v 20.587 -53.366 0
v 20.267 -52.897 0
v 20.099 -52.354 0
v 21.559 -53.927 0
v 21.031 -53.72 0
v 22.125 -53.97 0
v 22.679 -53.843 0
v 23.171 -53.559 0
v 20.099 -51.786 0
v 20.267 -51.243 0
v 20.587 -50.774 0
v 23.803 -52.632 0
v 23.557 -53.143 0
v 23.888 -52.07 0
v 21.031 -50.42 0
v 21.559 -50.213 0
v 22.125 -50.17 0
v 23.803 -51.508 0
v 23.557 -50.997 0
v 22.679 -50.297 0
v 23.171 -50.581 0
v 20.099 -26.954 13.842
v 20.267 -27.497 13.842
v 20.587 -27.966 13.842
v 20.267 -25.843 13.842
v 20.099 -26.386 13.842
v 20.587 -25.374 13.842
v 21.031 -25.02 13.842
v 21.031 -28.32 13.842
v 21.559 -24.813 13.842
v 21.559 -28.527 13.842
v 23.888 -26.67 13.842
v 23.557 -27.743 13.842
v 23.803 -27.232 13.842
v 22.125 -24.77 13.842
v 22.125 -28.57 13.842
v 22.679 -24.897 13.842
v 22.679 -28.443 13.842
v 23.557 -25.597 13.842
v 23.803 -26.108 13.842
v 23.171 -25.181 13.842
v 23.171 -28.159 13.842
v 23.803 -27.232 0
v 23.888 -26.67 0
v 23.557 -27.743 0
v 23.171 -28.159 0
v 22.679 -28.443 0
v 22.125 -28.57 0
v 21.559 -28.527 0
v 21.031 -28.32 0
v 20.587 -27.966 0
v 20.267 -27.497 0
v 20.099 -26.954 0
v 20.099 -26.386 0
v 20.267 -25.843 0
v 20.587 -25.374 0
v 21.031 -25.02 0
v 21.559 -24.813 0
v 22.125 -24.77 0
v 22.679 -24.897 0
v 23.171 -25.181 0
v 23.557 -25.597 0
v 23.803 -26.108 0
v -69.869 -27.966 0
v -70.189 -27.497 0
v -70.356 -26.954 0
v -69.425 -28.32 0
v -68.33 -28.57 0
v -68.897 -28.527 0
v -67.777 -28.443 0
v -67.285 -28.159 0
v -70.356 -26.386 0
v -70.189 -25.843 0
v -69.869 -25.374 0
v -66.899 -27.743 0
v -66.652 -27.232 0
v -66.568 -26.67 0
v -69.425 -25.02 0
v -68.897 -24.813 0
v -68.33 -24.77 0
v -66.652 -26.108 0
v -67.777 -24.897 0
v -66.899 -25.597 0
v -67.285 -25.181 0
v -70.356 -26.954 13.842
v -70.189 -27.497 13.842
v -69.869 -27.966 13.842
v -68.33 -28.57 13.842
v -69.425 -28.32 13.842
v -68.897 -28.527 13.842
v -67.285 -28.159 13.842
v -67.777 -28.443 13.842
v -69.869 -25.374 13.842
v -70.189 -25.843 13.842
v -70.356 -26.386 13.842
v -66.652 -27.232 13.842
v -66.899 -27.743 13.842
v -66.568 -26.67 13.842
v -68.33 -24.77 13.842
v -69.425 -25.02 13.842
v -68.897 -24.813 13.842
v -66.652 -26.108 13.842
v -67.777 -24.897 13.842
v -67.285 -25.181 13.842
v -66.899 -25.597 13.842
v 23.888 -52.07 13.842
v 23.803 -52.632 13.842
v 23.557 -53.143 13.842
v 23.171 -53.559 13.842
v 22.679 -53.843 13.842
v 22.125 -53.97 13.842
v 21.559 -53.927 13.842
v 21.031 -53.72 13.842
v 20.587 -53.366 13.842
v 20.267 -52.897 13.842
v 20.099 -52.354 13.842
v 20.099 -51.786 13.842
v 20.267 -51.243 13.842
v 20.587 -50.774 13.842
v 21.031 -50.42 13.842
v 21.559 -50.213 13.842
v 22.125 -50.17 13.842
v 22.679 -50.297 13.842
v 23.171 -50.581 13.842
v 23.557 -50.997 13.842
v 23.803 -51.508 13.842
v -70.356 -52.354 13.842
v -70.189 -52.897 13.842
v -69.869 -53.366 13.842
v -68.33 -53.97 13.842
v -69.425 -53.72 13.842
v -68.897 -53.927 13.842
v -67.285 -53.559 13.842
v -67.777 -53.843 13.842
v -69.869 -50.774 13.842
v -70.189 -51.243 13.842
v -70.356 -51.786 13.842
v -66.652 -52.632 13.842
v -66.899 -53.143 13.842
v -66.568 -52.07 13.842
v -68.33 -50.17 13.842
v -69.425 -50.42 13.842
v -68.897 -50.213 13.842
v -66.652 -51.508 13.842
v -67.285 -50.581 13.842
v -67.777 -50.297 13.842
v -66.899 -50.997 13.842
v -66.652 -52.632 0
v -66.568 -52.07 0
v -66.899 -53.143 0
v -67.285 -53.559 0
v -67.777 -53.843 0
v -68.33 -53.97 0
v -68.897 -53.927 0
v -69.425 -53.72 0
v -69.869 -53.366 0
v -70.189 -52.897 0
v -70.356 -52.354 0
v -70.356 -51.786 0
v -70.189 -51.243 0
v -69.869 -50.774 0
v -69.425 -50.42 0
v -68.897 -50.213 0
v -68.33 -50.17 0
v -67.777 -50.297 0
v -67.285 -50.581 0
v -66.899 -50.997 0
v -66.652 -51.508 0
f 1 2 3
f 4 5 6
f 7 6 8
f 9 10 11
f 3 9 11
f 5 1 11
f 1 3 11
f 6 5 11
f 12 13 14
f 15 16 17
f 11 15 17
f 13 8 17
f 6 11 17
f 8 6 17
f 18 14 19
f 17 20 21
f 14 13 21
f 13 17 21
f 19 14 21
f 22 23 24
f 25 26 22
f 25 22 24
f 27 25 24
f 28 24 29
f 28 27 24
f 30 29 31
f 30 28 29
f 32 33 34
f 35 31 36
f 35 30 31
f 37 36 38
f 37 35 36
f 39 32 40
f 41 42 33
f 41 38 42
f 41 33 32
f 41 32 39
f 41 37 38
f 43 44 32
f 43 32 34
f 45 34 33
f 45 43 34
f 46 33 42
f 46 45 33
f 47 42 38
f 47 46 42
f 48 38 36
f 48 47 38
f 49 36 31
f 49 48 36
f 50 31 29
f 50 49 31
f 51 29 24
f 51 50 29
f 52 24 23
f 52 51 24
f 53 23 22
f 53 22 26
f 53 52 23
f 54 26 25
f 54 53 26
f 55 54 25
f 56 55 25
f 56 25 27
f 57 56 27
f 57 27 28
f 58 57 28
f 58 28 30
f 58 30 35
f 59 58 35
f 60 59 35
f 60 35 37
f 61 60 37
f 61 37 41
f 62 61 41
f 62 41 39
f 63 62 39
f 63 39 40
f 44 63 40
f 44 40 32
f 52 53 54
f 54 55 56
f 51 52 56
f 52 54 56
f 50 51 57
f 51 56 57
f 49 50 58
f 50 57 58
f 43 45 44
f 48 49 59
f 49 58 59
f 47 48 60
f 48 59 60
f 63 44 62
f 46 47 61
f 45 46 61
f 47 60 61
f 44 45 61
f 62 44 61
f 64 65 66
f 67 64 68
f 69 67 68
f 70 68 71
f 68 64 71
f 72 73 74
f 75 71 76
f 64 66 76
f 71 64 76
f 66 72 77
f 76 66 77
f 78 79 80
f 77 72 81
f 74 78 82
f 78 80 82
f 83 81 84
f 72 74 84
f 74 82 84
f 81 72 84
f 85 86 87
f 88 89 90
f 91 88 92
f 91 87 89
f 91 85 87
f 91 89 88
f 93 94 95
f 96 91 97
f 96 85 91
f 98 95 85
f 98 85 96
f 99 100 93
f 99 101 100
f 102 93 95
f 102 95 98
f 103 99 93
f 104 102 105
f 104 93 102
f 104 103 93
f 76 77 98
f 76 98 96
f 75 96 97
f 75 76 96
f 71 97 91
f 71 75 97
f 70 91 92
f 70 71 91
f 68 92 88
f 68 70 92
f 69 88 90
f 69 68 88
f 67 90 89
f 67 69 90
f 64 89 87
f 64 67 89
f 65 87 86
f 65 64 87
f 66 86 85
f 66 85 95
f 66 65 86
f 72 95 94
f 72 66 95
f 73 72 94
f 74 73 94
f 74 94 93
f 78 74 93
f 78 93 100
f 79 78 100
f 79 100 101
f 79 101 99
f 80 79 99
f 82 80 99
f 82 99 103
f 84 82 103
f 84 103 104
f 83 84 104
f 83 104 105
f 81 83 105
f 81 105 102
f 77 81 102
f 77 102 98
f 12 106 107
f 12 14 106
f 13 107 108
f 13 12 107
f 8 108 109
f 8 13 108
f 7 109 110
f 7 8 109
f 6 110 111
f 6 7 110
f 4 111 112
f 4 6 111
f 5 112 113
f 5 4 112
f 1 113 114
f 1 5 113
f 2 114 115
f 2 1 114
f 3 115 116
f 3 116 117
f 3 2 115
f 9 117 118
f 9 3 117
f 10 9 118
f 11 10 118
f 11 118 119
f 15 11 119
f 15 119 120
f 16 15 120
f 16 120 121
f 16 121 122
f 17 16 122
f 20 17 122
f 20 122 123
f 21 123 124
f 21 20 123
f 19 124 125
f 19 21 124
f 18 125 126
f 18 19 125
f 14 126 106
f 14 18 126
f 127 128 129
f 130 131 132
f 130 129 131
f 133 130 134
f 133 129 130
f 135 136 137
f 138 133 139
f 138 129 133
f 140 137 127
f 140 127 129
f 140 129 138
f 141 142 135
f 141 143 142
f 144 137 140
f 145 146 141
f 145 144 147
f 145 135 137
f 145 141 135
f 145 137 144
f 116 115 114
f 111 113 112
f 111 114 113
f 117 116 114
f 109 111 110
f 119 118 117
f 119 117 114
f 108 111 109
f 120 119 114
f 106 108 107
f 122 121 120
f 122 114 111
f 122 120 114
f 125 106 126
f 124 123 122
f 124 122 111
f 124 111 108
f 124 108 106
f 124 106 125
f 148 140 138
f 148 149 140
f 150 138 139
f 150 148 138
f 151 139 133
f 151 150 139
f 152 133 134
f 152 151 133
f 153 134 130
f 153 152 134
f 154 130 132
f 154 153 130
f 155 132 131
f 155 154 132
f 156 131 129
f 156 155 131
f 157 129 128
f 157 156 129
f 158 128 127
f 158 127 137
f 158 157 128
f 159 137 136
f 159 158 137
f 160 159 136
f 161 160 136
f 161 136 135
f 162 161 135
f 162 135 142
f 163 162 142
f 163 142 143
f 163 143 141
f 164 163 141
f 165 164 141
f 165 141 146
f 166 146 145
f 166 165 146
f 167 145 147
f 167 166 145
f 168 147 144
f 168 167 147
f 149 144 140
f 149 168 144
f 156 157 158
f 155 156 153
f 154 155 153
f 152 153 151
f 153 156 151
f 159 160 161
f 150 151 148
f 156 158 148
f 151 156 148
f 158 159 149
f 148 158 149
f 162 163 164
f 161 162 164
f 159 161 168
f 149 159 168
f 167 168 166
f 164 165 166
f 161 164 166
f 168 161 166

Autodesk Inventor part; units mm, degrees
ref_plane "YZ Plane" through (0, 0, 0) normal (1, 0, 0) x (0, 1, 0)
ref_plane "XZ Plane" through (0, 0, 0) normal (0, 1, 0) x (-1, 0, 0)
sketch "Sketch2" plane through (0, 0, 0) normal (0, 0, 1) x (1, 0, 0)
  arc A0 (-66.5677, -26.035) -> (-67.8377, -24.765) centre (-67.8377, -26.035) ccw projected
  line L0 (-66.5677, -26.035) -> (-66.5677, -27.305) projected
  arc A1 (-67.8377, -28.575) -> (-66.5677, -27.305) centre (-67.8377, -27.305) ccw projected
  arc A2 (-66.5677, -51.435) -> (-67.8377, -50.165) centre (-67.8377, -51.435) ccw projected
  line L1 (-66.5677, -51.435) -> (-66.5677, -52.705) projected
  arc A3 (-67.8377, -53.975) -> (-66.5677, -52.705) centre (-67.8377, -52.705) ccw projected
  arc A4 (21.3481, -24.765) -> (20.0781, -26.035) centre (21.3481, -26.035) ccw projected
  line L2 (20.0781, -27.305) -> (20.0781, -26.035) projected
  arc A5 (20.0781, -27.305) -> (21.3481, -28.575) centre (21.3481, -27.305) ccw projected
  arc A6 (21.3481, -50.165) -> (20.0781, -51.435) centre (21.3481, -51.435) ccw projected
  line L3 (20.0781, -52.705) -> (20.0781, -51.435) projected
  arc A7 (20.0781, -52.705) -> (21.3481, -53.975) centre (21.3481, -52.705) ccw projected
  line L4 (21.3481, -24.765) -> (44.2081, -24.765) projected
  line L5 (44.2081, -28.575) -> (21.3481, -28.575) projected
  circle A8 centre (21.9831, -26.67) radius 1.905
  line L6 (-90.6977, -24.765) -> (-67.8377, -24.765)
  line L7 (-67.8377, -28.575) -> (-90.6977, -28.575)
  line L8 (-90.6977, -50.165) -> (-67.8377, -50.165)
  line L9 (-67.8377, -53.975) -> (-90.6977, -53.975)
  line L10 (21.3481, -50.165) -> (44.2081, -50.165)
  line L11 (44.2081, -53.975) -> (21.3481, -53.975)
  circle A9 centre (21.9831, -52.07) radius 1.905
  circle A10 centre (-68.4727, -52.07) radius 1.905
  circle A11 centre (-68.4727, -26.67) radius 1.905
  point P0 (0, 0)
ref_plane "Work Plane1" through (-61.5205, -96.6844, 13.8416) normal (0, 0, -1) x (0, 1, 0)
extrude "Extrusion1" add sketch "Sketch2" along normal up to surface (13.8416 mm away) contours A11 | A10 | A8 | A9
properties part number "OdroidPlateSpacer"
